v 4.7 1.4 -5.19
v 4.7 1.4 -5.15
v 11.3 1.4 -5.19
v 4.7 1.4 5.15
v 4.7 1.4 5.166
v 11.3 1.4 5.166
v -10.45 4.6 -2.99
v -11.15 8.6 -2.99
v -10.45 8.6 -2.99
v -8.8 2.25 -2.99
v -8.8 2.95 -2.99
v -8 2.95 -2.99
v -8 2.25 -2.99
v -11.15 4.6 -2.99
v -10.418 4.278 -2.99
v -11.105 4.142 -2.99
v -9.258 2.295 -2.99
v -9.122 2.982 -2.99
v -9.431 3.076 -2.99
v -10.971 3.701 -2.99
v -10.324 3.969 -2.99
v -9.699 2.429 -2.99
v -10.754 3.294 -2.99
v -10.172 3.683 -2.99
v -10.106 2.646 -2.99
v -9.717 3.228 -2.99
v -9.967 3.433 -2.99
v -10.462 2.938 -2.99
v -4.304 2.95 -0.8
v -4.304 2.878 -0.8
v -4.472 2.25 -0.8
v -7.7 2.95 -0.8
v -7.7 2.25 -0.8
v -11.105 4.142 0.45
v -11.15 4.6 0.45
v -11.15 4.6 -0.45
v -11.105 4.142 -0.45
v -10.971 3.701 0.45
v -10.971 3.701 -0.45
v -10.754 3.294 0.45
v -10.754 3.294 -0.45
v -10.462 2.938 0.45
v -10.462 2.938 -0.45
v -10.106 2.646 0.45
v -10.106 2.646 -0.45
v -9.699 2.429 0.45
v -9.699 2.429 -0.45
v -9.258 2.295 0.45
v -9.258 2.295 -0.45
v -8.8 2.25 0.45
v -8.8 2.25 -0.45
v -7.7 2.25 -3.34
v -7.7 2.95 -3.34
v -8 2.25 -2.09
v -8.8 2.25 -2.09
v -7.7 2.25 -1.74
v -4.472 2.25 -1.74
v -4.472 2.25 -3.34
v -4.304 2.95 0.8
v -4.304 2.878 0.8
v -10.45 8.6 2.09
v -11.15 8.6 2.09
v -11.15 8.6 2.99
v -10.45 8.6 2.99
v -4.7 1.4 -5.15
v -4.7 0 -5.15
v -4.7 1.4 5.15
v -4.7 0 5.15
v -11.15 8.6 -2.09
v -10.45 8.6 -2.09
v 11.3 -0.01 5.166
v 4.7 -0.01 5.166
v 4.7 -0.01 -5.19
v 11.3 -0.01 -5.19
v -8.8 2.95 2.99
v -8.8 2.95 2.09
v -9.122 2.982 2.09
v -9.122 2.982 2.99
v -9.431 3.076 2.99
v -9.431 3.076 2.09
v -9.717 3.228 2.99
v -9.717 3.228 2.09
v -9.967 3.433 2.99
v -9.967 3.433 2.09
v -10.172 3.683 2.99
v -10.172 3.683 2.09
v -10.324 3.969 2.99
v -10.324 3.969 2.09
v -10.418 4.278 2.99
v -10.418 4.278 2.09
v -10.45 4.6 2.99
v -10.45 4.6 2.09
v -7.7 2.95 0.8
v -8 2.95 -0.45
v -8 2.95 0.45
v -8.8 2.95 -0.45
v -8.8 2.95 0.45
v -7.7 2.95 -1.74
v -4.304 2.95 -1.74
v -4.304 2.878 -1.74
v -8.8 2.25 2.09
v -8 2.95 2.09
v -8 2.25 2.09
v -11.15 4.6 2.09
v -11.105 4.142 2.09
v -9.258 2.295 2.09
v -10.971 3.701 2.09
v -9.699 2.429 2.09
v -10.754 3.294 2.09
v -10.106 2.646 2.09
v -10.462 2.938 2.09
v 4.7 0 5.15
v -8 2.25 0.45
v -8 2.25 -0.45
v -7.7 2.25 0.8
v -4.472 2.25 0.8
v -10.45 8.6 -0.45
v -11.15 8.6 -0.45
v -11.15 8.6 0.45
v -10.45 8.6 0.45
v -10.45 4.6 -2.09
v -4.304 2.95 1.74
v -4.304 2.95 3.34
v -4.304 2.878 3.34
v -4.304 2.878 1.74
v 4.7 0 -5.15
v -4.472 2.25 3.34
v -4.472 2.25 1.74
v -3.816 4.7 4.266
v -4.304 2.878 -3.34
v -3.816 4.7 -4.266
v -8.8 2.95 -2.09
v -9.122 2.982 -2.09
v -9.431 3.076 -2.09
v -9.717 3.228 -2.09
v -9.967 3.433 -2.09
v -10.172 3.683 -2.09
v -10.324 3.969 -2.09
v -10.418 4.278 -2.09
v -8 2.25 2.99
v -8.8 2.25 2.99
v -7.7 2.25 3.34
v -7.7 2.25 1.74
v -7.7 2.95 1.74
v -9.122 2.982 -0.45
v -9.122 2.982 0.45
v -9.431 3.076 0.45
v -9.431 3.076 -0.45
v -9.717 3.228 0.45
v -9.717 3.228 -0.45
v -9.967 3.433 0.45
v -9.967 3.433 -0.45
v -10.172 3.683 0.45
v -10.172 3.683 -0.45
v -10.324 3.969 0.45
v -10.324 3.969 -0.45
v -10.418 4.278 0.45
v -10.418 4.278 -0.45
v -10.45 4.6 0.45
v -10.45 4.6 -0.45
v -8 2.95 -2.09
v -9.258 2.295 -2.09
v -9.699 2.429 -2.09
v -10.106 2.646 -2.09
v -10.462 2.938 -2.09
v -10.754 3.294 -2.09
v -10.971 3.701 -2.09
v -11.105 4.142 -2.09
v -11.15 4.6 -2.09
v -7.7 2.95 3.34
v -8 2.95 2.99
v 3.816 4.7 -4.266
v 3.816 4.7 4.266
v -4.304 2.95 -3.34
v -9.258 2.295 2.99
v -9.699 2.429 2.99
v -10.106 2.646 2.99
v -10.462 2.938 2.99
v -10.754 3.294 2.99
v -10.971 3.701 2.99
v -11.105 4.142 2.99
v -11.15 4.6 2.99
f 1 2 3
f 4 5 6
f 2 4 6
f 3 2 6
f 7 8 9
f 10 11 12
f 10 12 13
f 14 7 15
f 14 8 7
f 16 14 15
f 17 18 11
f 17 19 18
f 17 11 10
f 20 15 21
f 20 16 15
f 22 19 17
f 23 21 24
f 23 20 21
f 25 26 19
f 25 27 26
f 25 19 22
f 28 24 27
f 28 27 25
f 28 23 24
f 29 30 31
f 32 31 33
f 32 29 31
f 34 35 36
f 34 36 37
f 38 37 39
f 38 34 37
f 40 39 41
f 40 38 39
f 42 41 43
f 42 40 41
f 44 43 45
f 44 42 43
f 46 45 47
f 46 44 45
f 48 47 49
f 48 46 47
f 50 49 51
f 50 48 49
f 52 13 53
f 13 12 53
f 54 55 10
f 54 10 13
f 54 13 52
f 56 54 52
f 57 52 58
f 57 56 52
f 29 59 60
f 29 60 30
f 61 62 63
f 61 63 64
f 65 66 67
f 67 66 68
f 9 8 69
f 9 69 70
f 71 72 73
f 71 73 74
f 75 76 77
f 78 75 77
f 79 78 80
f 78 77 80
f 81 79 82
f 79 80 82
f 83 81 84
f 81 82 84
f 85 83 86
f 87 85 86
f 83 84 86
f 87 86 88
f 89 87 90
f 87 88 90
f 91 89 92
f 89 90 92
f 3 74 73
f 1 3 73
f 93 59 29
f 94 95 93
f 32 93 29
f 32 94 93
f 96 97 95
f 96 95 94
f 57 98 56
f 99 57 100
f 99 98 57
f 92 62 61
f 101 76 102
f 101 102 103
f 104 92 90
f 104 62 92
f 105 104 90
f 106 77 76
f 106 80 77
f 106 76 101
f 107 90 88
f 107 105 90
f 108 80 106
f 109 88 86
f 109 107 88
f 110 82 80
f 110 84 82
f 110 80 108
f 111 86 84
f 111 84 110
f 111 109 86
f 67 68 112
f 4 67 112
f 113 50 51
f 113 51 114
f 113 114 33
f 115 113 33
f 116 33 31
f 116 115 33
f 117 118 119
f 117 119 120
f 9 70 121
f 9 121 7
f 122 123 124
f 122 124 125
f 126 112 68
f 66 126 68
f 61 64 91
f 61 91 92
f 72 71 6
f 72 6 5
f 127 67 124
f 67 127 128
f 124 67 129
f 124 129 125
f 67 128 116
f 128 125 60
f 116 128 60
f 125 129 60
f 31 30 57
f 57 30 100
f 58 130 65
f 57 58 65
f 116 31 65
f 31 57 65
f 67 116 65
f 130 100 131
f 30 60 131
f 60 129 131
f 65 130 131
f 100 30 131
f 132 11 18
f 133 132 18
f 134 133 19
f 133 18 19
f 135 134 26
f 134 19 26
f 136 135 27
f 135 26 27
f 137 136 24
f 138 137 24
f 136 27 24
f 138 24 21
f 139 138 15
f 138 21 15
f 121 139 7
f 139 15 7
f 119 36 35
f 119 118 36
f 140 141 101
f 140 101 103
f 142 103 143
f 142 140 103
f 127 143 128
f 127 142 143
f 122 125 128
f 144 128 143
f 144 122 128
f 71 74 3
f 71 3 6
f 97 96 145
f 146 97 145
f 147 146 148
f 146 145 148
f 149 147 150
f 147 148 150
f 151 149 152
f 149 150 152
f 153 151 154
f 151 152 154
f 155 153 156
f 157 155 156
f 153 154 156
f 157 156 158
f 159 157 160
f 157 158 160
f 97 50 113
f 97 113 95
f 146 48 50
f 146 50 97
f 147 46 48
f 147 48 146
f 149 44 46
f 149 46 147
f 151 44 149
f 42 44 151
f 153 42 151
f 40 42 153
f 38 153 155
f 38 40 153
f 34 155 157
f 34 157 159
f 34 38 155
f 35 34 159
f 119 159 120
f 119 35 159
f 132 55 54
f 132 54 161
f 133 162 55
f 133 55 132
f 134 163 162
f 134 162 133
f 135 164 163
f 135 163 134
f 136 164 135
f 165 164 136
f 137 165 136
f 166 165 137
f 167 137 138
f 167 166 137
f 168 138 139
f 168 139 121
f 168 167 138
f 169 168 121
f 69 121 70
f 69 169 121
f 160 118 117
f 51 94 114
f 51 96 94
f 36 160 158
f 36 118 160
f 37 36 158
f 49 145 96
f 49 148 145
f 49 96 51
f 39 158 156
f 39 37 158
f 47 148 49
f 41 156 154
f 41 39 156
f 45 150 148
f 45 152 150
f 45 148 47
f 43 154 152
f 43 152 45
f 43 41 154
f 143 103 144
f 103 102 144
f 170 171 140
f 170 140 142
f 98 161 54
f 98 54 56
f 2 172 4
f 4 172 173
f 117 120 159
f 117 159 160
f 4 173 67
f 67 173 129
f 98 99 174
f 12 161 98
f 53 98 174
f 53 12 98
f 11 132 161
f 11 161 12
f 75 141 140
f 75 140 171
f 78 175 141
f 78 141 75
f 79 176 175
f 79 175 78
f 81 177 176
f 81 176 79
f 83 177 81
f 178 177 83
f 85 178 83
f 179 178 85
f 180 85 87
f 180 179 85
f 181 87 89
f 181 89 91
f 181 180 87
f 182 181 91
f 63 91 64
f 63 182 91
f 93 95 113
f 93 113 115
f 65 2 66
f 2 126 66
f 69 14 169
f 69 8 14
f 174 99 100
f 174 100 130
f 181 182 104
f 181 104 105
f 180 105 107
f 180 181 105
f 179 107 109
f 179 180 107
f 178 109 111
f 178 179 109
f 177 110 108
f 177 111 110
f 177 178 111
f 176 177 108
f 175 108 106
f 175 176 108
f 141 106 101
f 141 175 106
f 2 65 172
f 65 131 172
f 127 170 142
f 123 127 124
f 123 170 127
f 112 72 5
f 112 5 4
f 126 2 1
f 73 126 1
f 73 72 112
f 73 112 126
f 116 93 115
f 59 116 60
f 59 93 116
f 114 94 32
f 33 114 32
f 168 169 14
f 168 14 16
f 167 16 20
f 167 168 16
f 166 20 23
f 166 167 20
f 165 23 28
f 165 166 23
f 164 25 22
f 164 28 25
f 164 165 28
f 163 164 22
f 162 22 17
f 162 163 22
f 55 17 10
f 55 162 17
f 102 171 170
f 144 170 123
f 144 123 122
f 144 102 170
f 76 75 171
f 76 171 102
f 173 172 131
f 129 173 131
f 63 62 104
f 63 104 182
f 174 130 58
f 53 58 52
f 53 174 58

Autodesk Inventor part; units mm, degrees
ref_plane "YZ Plane" through (0, 0, 0) normal (1, 0, 0) x (0, 1, 0)
ref_plane "XZ Plane" through (0, 0, 0) normal (0, 1, 0) x (-1, 0, 0)
sketch "Sketch1" plane through (0, 0, 0) normal (0, 1, 0) x (-1, 0, 0)
  line L0 (4.7, 5.15) -> (-4.7, 5.15)
  line L1 (-4.7, 5.15) -> (-4.7, -5.15)
  line L2 (-4.7, -5.15) -> (4.7, -5.15)
  line L3 (4.7, -5.15) -> (4.7, 5.15)
  point P0 (0, 0)
  dimension "d0" = 9.4
  dimension "d1" = 4.7
  dimension "d2" = 10.3
  dimension "d3" = 5.15
extrude "Extrusion1" add sketch "Sketch1" along normal blind 4.7
chamfer "Chamfer1" distance 3.3 angle 15 1 edges at (0, 4.7, 5.15) measured on face at (-1.5667, 1.5667, 5.15)
chamfer "Chamfer2" distance 3.3 angle 15 1 edges at (4.7, 4.7, -0.4421) measured on face at (4.7, 3.1333, -2.0114)
chamfer "Chamfer3" distance 3.3 angle 15 1 edges at (-0.4421, 4.7, -5.15) measured on face at (-1.8614, 3.1333, -5.15)
chamfer "Chamfer4" distance 3.3 angle 15 1 edges at (-4.7, 4.7, 0) measured on face at (-4.7, 2.5, -1.4219)
sketch "Sketch2" plane through (0, 0, 0) normal (0, -1, 0) x (1, 0, 0)
  line L0 (4.7, 5.15) -> (4.7, -5.15) projected
  line L1 (11.3, -5.15) -> (11.3, 5.1662)
  line L2 (11.3, 5.1662) -> (4.7, 5.1662)
  line L3 (4.7, 5.1662) -> (4.7, -5.15)
  line L4 (-4.7, 5.15) -> (4.7, 5.15) projected
  line L5 (11.3, -5.15) -> (11.3, -5.1902)
  line L6 (11.3, -5.1902) -> (4.7, -5.1902)
  line L7 (4.7, -5.1902) -> (4.7, -5.15)
  point P0 (0, 0)
  dimension "d18" = 6.6
extrude "Extrusion2" add sketch "Sketch2" against normal blind 1.4 and the other way blind 0.01
ref_plane "Work Plane1" through (0, 2.6, 0) normal (0, -1, 0) x (1, 0, 0)
sketch "Sketch3" plane through (0, 2.6, 0) normal (0, -1, 0) x (1, 0, 0)
  line L0 (-4.304, -0.8) -> (-8, -0.8)
  line L1 (-8, -0.8) -> (-8, 0.8)
  line L2 (-8, 0.8) -> (-4.304, 0.8)
  line L3 (-4.304, 0.8) -> (-4.304, -0.8)
  line L4 (-4.7, -5.15) -> (-4.7, 5.15) projected
  line L5 (-4.7, -5.15) -> (-4.7, 5.15) projected
  line L6 (-4.7, 0) -> (-3.1889, 0)
  line L7 (-8, -0.45) -> (-7.7, -0.8)
  line L8 (-8, 0.45) -> (-7.7, 0.8)
  point P0 (0, 0)
  dimension "d25" = 3.3
  dimension "d26" = 1.6
  dimension "d27" = 0.8
  dimension "d28" = 3
  dimension "d29" = 3
  dimension "d30" = 0.9
  dimension "d31" = 0.45
extrude "Extrusion3" add sketch "Sketch3" along normal mid plane 0.7 contours L7 L1 L8 L2 L4 L0 | L4 L6 L3 L0 | L4 L2 L3 L6
sketch "Sketch4" plane through (-8, 2.25, -0.45) normal (-1, 0, 0) x (0, 0, 1)
  line L0 (1.25, 0.7) -> (-0.35, 0.7) projected
  line L1 (1.25, 0) -> (-0.35, 0) projected
  line L2 (0.9, 0.7) -> (0, 0.7)
  line L3 (0, 0.7) -> (0, 0)
  line L4 (0, 0) -> (0.9, 0)
  line L5 (0.9, 0) -> (0.9, 0.7)
  line L6 (0.9, 0.7) -> (0.9, 0) projected
  line L7 (0.9, 0.126) -> (0.9, 0.1378)
  point P0 (0.45, -2.25)
  dimension "d34" = 0.9
  dimension "d35" = 0
sketch "Sketch5" plane through (0, 0, 0) normal (0, 0, 1) x (1, 0, 0)
  line L0 (-8, 2.95) -> (-8, 2.25) projected
  line L1 (-8, 2.6) -> (-8.8, 2.6)
  line L2 (-10.8, 4.6) -> (-10.8, 8.6)
  line L3 (-4.557, 8.6) -> (-13.8977, 8.6)
  line L4 (4.7, 0) -> (-4.7, 0) projected
  arc A0 (-10.8, 4.6) -> (-8.8, 2.6) centre (-8.8, 4.6) ccw
  point P0 (0, 0)
  dimension "d36" = 8.6
  dimension "d38" = 2.8
  dimension "d39" = 2
sweep "Sweep1" add profiles "Sketch4" path "Sketch5" path curves L1 A0 L2
pattern_linear "Rectangular Pattern1" count 3 spacing 2.54 along (0, 0, -1) of "Extrusion3", "Sweep1" first direction both ways yes
properties part number "TO-220_UnderHeat"
